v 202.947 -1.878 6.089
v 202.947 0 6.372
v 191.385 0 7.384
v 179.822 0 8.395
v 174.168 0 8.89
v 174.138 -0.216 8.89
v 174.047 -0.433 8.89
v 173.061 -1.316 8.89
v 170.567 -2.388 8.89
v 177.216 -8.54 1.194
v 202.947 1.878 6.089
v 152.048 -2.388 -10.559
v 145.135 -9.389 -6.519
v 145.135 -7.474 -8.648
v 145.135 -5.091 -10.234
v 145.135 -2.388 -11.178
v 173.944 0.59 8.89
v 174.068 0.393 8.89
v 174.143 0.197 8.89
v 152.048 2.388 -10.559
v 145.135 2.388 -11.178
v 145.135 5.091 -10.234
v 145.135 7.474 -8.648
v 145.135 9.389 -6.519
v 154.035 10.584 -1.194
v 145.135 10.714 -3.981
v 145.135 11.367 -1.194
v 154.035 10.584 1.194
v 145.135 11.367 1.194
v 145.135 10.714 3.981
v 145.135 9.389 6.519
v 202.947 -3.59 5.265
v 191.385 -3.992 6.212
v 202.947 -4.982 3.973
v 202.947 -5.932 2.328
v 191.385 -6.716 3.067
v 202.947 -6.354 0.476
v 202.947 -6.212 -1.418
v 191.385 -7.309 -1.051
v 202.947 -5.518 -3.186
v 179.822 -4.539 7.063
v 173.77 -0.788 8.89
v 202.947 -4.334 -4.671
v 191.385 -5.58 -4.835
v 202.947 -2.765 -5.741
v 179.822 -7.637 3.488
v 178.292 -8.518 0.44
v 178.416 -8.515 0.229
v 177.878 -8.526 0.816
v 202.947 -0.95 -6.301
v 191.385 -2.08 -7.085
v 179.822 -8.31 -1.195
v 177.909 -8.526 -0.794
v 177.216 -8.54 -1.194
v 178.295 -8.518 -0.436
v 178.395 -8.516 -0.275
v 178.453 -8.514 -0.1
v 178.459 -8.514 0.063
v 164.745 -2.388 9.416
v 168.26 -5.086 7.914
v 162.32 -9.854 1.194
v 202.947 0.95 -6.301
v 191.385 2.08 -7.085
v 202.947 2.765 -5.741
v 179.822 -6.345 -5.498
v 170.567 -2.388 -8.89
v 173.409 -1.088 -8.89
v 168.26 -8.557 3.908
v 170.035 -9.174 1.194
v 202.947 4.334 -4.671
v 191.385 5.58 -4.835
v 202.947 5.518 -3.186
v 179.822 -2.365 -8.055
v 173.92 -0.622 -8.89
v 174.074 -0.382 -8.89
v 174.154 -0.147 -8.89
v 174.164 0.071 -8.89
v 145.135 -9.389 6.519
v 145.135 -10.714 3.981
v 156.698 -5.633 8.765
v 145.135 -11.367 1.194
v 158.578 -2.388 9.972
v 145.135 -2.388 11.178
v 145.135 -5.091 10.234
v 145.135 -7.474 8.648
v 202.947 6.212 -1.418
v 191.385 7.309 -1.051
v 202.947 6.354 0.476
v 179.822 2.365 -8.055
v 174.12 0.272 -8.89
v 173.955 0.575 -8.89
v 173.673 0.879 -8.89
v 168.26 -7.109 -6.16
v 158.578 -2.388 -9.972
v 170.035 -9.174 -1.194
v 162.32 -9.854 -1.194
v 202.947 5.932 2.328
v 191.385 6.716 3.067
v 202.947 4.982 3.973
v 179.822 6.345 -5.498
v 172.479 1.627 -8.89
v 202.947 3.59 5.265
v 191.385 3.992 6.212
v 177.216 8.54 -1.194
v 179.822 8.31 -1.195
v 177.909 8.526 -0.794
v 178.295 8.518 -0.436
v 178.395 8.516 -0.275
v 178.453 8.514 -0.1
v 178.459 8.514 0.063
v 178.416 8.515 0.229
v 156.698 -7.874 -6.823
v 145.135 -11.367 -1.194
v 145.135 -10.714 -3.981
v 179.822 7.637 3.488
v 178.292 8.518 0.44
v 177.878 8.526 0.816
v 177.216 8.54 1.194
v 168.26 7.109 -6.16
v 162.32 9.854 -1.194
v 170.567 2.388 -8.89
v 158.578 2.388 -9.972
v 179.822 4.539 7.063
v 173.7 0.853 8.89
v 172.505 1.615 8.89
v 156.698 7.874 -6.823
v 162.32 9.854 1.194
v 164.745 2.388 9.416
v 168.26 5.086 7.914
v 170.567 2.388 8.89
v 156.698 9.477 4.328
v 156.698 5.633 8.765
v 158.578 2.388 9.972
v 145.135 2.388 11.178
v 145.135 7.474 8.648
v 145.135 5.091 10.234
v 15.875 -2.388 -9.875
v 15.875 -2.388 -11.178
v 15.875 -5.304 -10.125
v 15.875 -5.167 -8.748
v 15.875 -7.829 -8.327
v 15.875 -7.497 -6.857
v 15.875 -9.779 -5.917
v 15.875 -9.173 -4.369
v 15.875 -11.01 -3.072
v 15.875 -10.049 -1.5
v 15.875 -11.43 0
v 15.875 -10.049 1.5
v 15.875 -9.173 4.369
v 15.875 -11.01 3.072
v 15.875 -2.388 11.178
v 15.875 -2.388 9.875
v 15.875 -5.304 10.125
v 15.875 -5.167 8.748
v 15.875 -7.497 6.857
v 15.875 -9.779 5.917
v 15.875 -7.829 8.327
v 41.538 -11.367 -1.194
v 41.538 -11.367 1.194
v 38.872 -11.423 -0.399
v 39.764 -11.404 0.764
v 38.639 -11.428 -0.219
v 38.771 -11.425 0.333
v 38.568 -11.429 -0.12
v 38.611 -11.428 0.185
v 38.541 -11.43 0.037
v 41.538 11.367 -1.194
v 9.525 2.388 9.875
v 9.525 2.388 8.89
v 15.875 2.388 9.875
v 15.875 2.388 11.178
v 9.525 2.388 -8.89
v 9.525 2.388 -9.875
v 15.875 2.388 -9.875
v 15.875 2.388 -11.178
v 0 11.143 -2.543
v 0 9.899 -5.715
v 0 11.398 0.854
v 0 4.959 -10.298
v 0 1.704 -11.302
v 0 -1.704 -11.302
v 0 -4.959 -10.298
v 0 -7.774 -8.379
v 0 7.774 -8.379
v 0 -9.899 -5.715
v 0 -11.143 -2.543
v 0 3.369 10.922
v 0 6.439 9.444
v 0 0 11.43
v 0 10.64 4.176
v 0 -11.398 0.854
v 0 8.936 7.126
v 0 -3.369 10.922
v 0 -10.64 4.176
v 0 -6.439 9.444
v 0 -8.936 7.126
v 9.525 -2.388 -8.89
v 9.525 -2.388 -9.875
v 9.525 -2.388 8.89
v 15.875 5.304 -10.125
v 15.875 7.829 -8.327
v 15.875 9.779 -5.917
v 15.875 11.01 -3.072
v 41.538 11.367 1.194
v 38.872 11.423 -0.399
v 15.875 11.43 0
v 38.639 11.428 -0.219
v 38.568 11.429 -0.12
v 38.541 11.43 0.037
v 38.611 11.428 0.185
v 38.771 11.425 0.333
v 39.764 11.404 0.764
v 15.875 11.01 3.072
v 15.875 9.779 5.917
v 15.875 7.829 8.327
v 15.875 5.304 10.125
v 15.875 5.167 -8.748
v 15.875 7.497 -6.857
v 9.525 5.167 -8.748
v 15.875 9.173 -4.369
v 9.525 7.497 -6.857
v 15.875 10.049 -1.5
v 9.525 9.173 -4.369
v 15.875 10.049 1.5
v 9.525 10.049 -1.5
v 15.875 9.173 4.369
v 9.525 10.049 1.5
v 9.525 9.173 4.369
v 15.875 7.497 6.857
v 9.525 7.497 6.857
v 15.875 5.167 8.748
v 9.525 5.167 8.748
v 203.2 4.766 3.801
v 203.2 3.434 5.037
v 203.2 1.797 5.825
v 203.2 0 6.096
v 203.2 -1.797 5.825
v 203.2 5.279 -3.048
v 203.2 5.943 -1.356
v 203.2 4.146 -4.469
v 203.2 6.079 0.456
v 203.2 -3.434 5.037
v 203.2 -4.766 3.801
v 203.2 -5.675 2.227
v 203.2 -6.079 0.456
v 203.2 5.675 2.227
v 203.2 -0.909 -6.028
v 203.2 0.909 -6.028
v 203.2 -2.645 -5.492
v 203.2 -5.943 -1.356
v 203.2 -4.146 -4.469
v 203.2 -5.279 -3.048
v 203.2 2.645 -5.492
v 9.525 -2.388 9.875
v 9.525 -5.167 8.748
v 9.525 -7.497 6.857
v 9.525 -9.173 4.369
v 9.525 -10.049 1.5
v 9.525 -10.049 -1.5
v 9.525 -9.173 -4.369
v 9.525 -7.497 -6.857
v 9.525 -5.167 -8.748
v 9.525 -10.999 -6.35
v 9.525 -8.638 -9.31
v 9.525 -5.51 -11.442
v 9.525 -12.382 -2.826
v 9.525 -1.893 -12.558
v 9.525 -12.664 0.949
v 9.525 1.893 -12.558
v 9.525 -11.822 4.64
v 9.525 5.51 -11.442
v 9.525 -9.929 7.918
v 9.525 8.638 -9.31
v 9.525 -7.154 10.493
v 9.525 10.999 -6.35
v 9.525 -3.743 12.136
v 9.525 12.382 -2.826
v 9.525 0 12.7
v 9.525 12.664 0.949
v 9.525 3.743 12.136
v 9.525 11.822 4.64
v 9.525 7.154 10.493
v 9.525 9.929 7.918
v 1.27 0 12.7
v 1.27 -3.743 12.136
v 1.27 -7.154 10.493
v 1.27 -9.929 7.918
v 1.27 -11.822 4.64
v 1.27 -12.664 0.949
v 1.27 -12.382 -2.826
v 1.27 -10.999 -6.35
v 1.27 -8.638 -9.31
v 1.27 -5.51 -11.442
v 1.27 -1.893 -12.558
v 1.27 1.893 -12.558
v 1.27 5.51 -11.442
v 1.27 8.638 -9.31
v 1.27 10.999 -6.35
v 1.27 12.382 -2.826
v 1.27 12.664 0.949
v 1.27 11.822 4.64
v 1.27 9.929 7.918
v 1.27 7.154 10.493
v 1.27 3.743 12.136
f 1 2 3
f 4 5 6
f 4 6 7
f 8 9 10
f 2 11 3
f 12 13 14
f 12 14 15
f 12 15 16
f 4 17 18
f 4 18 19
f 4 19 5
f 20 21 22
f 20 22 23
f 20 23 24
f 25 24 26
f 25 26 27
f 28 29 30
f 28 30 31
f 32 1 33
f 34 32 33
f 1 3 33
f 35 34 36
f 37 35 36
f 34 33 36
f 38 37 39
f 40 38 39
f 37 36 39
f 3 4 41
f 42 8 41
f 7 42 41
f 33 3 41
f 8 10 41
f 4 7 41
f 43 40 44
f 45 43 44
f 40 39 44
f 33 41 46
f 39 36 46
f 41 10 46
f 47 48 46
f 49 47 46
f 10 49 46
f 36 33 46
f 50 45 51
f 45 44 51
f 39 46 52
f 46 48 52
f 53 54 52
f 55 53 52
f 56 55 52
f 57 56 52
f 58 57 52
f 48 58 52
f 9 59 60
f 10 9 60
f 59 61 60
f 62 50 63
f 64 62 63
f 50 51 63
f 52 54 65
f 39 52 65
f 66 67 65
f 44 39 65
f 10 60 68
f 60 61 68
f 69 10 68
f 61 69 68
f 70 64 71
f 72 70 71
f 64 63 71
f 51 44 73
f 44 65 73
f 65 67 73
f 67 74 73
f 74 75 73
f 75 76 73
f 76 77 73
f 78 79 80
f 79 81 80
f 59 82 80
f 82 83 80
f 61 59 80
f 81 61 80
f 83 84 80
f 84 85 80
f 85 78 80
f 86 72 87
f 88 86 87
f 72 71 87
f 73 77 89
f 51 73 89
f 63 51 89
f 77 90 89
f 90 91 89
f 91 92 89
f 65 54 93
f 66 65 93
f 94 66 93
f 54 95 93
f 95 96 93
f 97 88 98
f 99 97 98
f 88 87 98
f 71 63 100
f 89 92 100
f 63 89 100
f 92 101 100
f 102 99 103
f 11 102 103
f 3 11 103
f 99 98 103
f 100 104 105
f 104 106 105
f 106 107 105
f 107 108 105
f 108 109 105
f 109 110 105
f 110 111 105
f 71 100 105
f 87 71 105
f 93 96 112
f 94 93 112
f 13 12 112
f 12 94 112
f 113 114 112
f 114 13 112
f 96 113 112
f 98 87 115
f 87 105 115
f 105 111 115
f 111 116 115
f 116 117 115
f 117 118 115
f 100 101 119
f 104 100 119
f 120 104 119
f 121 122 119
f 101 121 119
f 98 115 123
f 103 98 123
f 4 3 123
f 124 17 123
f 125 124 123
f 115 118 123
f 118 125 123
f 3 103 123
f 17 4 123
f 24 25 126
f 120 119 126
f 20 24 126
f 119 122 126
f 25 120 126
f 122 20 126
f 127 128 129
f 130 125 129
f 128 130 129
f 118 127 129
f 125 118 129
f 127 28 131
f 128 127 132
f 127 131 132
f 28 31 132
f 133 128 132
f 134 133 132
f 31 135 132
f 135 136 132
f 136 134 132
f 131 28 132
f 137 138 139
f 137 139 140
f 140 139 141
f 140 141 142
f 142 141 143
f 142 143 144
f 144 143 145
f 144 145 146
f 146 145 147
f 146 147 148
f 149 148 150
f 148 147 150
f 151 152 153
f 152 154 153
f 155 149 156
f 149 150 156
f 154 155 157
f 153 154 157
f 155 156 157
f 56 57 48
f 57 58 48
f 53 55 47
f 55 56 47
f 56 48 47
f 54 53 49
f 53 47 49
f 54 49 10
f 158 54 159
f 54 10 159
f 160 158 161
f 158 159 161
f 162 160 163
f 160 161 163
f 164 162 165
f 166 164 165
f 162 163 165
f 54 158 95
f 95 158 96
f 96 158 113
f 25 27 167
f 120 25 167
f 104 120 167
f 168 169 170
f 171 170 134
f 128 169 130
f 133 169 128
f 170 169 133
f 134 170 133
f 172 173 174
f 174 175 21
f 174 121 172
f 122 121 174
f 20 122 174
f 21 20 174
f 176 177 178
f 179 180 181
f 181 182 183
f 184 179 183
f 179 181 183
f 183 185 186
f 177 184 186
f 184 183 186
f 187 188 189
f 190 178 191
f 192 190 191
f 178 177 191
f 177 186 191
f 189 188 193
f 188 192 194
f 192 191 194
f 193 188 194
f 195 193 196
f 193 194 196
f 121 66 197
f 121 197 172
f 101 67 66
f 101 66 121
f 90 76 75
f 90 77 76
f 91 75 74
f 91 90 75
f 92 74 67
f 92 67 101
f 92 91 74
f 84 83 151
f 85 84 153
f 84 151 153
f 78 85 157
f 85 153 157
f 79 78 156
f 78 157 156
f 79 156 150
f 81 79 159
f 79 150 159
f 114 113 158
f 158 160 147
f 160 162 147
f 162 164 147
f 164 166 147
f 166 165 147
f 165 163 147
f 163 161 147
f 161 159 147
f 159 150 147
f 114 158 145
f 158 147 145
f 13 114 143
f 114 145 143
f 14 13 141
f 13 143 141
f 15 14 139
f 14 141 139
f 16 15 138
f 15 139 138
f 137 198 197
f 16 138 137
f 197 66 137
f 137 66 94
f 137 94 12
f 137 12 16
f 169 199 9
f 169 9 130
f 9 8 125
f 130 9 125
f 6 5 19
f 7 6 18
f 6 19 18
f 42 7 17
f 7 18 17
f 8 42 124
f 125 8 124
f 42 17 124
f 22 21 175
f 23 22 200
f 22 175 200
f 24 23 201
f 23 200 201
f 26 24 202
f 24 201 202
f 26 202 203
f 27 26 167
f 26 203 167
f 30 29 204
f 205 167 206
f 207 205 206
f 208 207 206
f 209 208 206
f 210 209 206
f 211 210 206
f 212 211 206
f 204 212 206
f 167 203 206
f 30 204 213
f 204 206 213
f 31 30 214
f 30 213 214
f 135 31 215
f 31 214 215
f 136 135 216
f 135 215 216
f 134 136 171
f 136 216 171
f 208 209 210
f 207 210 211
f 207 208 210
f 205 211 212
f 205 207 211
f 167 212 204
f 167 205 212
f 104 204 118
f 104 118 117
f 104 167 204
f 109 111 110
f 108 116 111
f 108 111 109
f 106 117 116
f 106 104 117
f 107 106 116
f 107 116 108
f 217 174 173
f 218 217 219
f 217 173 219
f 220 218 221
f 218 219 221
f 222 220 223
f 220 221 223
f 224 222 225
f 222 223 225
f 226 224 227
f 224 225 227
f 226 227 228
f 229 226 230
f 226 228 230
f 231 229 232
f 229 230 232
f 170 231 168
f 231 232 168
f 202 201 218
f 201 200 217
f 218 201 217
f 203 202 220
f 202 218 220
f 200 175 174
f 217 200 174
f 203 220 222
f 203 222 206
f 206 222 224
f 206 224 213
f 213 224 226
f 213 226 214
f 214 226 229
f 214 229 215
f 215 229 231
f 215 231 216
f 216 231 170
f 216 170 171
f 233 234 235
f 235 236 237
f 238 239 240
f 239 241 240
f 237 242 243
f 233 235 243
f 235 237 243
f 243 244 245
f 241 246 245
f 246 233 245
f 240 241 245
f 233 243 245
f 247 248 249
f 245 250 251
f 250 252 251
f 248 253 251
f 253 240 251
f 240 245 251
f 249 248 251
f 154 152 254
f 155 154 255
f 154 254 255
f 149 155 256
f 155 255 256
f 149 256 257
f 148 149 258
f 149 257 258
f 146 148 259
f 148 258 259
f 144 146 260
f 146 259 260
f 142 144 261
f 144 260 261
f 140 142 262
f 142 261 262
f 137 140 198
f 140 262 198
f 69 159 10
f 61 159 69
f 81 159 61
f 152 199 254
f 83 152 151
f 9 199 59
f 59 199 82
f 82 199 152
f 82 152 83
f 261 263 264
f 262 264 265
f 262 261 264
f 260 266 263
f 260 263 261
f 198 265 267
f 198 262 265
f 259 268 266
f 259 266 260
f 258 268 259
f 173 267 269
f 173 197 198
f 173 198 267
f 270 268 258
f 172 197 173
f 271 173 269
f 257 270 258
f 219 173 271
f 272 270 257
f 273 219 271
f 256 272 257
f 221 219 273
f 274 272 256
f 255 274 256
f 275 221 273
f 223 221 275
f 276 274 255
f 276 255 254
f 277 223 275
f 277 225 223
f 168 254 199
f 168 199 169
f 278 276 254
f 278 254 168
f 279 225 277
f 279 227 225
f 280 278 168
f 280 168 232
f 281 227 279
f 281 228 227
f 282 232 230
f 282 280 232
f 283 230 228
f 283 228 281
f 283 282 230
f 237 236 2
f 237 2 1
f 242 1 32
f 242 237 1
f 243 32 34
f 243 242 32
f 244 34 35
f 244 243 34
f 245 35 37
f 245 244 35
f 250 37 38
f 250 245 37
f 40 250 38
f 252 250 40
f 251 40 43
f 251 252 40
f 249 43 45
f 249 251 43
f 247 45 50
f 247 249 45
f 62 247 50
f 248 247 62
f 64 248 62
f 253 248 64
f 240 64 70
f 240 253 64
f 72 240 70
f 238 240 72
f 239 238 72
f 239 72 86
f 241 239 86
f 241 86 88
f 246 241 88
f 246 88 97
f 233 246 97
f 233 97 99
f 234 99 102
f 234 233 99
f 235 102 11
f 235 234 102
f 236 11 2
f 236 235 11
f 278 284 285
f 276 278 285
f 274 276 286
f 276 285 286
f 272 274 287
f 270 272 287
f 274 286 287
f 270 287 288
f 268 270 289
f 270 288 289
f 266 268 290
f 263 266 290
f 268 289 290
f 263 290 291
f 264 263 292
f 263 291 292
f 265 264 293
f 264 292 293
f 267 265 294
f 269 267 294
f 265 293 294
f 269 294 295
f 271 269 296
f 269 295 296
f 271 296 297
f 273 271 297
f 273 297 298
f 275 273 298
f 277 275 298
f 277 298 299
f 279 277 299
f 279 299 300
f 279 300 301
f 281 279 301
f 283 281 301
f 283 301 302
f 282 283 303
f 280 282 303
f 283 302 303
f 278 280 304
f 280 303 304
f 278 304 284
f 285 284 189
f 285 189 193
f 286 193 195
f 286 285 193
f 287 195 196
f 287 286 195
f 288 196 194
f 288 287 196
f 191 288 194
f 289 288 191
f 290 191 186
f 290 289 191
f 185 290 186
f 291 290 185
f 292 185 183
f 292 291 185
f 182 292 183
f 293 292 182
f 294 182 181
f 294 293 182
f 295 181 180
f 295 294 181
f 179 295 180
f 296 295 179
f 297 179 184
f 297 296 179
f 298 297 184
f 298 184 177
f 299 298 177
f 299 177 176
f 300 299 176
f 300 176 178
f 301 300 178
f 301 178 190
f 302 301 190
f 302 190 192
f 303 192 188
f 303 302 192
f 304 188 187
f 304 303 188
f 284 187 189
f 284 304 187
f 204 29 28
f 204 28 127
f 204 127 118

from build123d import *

# Parameters (mm, degrees)
F3_SIZE  = 1.27
F4_SIZE  = 0.254
F5_W     = 4.7752
F5_H     = 2.54
F6_DEPTH = 193.675
F8_DEPTH = 1.1938


with BuildPart() as f2:
    # F0 (on Front) → F2 (revolve)
    with BuildSketch(Plane.XZ):
        Polygon((0, 12.7), (0, 0), (203.2, 0), (203.2, 6.35), (145.135334, 11.43), (15.875, 11.43), (15.875, 10.16), (9.525, 10.16), (9.525, 12.7), align=None)
    revolve(axis=Axis((47.973725, 0, 0), (1, 0, 0)))

    # F3
    f3_edges = [f2.edges().sort_by_distance(p)[0] for p in [
        (0, 0, -12.7),
    ]]
    chamfer(f3_edges, length=F3_SIZE)

    # F4
    f4_edges = [f2.edges().sort_by_distance(p)[0] for p in [
        (203.2, 0, -6.35),
    ]]
    chamfer(f4_edges, length=F4_SIZE)

    # F5 (on face) → F6 (cut, through all)
    with BuildSketch(Plane.YZ.offset(203.2)):
        with Locations((0, 10.16)):
            Rectangle(F5_W, F5_H)
        with Locations((0, -10.16)):
            Rectangle(F5_W, F5_H)
    extrude(amount=-F6_DEPTH, mode=Mode.SUBTRACT)

    # F7 (on Top) → F8 (cut, symmetric)
    with BuildSketch(Plane.XY):
        Polygon((28.575, 11.637617), (180.941923, 8.462617), (180.941923, 11.637617), align=None)
        Polygon((180.941923, -8.462617), (28.575, -11.637617), (180.941923, -11.637617), align=None)
    extrude(amount=F8_DEPTH, both=True, mode=Mode.SUBTRACT)


solid = f2.part
